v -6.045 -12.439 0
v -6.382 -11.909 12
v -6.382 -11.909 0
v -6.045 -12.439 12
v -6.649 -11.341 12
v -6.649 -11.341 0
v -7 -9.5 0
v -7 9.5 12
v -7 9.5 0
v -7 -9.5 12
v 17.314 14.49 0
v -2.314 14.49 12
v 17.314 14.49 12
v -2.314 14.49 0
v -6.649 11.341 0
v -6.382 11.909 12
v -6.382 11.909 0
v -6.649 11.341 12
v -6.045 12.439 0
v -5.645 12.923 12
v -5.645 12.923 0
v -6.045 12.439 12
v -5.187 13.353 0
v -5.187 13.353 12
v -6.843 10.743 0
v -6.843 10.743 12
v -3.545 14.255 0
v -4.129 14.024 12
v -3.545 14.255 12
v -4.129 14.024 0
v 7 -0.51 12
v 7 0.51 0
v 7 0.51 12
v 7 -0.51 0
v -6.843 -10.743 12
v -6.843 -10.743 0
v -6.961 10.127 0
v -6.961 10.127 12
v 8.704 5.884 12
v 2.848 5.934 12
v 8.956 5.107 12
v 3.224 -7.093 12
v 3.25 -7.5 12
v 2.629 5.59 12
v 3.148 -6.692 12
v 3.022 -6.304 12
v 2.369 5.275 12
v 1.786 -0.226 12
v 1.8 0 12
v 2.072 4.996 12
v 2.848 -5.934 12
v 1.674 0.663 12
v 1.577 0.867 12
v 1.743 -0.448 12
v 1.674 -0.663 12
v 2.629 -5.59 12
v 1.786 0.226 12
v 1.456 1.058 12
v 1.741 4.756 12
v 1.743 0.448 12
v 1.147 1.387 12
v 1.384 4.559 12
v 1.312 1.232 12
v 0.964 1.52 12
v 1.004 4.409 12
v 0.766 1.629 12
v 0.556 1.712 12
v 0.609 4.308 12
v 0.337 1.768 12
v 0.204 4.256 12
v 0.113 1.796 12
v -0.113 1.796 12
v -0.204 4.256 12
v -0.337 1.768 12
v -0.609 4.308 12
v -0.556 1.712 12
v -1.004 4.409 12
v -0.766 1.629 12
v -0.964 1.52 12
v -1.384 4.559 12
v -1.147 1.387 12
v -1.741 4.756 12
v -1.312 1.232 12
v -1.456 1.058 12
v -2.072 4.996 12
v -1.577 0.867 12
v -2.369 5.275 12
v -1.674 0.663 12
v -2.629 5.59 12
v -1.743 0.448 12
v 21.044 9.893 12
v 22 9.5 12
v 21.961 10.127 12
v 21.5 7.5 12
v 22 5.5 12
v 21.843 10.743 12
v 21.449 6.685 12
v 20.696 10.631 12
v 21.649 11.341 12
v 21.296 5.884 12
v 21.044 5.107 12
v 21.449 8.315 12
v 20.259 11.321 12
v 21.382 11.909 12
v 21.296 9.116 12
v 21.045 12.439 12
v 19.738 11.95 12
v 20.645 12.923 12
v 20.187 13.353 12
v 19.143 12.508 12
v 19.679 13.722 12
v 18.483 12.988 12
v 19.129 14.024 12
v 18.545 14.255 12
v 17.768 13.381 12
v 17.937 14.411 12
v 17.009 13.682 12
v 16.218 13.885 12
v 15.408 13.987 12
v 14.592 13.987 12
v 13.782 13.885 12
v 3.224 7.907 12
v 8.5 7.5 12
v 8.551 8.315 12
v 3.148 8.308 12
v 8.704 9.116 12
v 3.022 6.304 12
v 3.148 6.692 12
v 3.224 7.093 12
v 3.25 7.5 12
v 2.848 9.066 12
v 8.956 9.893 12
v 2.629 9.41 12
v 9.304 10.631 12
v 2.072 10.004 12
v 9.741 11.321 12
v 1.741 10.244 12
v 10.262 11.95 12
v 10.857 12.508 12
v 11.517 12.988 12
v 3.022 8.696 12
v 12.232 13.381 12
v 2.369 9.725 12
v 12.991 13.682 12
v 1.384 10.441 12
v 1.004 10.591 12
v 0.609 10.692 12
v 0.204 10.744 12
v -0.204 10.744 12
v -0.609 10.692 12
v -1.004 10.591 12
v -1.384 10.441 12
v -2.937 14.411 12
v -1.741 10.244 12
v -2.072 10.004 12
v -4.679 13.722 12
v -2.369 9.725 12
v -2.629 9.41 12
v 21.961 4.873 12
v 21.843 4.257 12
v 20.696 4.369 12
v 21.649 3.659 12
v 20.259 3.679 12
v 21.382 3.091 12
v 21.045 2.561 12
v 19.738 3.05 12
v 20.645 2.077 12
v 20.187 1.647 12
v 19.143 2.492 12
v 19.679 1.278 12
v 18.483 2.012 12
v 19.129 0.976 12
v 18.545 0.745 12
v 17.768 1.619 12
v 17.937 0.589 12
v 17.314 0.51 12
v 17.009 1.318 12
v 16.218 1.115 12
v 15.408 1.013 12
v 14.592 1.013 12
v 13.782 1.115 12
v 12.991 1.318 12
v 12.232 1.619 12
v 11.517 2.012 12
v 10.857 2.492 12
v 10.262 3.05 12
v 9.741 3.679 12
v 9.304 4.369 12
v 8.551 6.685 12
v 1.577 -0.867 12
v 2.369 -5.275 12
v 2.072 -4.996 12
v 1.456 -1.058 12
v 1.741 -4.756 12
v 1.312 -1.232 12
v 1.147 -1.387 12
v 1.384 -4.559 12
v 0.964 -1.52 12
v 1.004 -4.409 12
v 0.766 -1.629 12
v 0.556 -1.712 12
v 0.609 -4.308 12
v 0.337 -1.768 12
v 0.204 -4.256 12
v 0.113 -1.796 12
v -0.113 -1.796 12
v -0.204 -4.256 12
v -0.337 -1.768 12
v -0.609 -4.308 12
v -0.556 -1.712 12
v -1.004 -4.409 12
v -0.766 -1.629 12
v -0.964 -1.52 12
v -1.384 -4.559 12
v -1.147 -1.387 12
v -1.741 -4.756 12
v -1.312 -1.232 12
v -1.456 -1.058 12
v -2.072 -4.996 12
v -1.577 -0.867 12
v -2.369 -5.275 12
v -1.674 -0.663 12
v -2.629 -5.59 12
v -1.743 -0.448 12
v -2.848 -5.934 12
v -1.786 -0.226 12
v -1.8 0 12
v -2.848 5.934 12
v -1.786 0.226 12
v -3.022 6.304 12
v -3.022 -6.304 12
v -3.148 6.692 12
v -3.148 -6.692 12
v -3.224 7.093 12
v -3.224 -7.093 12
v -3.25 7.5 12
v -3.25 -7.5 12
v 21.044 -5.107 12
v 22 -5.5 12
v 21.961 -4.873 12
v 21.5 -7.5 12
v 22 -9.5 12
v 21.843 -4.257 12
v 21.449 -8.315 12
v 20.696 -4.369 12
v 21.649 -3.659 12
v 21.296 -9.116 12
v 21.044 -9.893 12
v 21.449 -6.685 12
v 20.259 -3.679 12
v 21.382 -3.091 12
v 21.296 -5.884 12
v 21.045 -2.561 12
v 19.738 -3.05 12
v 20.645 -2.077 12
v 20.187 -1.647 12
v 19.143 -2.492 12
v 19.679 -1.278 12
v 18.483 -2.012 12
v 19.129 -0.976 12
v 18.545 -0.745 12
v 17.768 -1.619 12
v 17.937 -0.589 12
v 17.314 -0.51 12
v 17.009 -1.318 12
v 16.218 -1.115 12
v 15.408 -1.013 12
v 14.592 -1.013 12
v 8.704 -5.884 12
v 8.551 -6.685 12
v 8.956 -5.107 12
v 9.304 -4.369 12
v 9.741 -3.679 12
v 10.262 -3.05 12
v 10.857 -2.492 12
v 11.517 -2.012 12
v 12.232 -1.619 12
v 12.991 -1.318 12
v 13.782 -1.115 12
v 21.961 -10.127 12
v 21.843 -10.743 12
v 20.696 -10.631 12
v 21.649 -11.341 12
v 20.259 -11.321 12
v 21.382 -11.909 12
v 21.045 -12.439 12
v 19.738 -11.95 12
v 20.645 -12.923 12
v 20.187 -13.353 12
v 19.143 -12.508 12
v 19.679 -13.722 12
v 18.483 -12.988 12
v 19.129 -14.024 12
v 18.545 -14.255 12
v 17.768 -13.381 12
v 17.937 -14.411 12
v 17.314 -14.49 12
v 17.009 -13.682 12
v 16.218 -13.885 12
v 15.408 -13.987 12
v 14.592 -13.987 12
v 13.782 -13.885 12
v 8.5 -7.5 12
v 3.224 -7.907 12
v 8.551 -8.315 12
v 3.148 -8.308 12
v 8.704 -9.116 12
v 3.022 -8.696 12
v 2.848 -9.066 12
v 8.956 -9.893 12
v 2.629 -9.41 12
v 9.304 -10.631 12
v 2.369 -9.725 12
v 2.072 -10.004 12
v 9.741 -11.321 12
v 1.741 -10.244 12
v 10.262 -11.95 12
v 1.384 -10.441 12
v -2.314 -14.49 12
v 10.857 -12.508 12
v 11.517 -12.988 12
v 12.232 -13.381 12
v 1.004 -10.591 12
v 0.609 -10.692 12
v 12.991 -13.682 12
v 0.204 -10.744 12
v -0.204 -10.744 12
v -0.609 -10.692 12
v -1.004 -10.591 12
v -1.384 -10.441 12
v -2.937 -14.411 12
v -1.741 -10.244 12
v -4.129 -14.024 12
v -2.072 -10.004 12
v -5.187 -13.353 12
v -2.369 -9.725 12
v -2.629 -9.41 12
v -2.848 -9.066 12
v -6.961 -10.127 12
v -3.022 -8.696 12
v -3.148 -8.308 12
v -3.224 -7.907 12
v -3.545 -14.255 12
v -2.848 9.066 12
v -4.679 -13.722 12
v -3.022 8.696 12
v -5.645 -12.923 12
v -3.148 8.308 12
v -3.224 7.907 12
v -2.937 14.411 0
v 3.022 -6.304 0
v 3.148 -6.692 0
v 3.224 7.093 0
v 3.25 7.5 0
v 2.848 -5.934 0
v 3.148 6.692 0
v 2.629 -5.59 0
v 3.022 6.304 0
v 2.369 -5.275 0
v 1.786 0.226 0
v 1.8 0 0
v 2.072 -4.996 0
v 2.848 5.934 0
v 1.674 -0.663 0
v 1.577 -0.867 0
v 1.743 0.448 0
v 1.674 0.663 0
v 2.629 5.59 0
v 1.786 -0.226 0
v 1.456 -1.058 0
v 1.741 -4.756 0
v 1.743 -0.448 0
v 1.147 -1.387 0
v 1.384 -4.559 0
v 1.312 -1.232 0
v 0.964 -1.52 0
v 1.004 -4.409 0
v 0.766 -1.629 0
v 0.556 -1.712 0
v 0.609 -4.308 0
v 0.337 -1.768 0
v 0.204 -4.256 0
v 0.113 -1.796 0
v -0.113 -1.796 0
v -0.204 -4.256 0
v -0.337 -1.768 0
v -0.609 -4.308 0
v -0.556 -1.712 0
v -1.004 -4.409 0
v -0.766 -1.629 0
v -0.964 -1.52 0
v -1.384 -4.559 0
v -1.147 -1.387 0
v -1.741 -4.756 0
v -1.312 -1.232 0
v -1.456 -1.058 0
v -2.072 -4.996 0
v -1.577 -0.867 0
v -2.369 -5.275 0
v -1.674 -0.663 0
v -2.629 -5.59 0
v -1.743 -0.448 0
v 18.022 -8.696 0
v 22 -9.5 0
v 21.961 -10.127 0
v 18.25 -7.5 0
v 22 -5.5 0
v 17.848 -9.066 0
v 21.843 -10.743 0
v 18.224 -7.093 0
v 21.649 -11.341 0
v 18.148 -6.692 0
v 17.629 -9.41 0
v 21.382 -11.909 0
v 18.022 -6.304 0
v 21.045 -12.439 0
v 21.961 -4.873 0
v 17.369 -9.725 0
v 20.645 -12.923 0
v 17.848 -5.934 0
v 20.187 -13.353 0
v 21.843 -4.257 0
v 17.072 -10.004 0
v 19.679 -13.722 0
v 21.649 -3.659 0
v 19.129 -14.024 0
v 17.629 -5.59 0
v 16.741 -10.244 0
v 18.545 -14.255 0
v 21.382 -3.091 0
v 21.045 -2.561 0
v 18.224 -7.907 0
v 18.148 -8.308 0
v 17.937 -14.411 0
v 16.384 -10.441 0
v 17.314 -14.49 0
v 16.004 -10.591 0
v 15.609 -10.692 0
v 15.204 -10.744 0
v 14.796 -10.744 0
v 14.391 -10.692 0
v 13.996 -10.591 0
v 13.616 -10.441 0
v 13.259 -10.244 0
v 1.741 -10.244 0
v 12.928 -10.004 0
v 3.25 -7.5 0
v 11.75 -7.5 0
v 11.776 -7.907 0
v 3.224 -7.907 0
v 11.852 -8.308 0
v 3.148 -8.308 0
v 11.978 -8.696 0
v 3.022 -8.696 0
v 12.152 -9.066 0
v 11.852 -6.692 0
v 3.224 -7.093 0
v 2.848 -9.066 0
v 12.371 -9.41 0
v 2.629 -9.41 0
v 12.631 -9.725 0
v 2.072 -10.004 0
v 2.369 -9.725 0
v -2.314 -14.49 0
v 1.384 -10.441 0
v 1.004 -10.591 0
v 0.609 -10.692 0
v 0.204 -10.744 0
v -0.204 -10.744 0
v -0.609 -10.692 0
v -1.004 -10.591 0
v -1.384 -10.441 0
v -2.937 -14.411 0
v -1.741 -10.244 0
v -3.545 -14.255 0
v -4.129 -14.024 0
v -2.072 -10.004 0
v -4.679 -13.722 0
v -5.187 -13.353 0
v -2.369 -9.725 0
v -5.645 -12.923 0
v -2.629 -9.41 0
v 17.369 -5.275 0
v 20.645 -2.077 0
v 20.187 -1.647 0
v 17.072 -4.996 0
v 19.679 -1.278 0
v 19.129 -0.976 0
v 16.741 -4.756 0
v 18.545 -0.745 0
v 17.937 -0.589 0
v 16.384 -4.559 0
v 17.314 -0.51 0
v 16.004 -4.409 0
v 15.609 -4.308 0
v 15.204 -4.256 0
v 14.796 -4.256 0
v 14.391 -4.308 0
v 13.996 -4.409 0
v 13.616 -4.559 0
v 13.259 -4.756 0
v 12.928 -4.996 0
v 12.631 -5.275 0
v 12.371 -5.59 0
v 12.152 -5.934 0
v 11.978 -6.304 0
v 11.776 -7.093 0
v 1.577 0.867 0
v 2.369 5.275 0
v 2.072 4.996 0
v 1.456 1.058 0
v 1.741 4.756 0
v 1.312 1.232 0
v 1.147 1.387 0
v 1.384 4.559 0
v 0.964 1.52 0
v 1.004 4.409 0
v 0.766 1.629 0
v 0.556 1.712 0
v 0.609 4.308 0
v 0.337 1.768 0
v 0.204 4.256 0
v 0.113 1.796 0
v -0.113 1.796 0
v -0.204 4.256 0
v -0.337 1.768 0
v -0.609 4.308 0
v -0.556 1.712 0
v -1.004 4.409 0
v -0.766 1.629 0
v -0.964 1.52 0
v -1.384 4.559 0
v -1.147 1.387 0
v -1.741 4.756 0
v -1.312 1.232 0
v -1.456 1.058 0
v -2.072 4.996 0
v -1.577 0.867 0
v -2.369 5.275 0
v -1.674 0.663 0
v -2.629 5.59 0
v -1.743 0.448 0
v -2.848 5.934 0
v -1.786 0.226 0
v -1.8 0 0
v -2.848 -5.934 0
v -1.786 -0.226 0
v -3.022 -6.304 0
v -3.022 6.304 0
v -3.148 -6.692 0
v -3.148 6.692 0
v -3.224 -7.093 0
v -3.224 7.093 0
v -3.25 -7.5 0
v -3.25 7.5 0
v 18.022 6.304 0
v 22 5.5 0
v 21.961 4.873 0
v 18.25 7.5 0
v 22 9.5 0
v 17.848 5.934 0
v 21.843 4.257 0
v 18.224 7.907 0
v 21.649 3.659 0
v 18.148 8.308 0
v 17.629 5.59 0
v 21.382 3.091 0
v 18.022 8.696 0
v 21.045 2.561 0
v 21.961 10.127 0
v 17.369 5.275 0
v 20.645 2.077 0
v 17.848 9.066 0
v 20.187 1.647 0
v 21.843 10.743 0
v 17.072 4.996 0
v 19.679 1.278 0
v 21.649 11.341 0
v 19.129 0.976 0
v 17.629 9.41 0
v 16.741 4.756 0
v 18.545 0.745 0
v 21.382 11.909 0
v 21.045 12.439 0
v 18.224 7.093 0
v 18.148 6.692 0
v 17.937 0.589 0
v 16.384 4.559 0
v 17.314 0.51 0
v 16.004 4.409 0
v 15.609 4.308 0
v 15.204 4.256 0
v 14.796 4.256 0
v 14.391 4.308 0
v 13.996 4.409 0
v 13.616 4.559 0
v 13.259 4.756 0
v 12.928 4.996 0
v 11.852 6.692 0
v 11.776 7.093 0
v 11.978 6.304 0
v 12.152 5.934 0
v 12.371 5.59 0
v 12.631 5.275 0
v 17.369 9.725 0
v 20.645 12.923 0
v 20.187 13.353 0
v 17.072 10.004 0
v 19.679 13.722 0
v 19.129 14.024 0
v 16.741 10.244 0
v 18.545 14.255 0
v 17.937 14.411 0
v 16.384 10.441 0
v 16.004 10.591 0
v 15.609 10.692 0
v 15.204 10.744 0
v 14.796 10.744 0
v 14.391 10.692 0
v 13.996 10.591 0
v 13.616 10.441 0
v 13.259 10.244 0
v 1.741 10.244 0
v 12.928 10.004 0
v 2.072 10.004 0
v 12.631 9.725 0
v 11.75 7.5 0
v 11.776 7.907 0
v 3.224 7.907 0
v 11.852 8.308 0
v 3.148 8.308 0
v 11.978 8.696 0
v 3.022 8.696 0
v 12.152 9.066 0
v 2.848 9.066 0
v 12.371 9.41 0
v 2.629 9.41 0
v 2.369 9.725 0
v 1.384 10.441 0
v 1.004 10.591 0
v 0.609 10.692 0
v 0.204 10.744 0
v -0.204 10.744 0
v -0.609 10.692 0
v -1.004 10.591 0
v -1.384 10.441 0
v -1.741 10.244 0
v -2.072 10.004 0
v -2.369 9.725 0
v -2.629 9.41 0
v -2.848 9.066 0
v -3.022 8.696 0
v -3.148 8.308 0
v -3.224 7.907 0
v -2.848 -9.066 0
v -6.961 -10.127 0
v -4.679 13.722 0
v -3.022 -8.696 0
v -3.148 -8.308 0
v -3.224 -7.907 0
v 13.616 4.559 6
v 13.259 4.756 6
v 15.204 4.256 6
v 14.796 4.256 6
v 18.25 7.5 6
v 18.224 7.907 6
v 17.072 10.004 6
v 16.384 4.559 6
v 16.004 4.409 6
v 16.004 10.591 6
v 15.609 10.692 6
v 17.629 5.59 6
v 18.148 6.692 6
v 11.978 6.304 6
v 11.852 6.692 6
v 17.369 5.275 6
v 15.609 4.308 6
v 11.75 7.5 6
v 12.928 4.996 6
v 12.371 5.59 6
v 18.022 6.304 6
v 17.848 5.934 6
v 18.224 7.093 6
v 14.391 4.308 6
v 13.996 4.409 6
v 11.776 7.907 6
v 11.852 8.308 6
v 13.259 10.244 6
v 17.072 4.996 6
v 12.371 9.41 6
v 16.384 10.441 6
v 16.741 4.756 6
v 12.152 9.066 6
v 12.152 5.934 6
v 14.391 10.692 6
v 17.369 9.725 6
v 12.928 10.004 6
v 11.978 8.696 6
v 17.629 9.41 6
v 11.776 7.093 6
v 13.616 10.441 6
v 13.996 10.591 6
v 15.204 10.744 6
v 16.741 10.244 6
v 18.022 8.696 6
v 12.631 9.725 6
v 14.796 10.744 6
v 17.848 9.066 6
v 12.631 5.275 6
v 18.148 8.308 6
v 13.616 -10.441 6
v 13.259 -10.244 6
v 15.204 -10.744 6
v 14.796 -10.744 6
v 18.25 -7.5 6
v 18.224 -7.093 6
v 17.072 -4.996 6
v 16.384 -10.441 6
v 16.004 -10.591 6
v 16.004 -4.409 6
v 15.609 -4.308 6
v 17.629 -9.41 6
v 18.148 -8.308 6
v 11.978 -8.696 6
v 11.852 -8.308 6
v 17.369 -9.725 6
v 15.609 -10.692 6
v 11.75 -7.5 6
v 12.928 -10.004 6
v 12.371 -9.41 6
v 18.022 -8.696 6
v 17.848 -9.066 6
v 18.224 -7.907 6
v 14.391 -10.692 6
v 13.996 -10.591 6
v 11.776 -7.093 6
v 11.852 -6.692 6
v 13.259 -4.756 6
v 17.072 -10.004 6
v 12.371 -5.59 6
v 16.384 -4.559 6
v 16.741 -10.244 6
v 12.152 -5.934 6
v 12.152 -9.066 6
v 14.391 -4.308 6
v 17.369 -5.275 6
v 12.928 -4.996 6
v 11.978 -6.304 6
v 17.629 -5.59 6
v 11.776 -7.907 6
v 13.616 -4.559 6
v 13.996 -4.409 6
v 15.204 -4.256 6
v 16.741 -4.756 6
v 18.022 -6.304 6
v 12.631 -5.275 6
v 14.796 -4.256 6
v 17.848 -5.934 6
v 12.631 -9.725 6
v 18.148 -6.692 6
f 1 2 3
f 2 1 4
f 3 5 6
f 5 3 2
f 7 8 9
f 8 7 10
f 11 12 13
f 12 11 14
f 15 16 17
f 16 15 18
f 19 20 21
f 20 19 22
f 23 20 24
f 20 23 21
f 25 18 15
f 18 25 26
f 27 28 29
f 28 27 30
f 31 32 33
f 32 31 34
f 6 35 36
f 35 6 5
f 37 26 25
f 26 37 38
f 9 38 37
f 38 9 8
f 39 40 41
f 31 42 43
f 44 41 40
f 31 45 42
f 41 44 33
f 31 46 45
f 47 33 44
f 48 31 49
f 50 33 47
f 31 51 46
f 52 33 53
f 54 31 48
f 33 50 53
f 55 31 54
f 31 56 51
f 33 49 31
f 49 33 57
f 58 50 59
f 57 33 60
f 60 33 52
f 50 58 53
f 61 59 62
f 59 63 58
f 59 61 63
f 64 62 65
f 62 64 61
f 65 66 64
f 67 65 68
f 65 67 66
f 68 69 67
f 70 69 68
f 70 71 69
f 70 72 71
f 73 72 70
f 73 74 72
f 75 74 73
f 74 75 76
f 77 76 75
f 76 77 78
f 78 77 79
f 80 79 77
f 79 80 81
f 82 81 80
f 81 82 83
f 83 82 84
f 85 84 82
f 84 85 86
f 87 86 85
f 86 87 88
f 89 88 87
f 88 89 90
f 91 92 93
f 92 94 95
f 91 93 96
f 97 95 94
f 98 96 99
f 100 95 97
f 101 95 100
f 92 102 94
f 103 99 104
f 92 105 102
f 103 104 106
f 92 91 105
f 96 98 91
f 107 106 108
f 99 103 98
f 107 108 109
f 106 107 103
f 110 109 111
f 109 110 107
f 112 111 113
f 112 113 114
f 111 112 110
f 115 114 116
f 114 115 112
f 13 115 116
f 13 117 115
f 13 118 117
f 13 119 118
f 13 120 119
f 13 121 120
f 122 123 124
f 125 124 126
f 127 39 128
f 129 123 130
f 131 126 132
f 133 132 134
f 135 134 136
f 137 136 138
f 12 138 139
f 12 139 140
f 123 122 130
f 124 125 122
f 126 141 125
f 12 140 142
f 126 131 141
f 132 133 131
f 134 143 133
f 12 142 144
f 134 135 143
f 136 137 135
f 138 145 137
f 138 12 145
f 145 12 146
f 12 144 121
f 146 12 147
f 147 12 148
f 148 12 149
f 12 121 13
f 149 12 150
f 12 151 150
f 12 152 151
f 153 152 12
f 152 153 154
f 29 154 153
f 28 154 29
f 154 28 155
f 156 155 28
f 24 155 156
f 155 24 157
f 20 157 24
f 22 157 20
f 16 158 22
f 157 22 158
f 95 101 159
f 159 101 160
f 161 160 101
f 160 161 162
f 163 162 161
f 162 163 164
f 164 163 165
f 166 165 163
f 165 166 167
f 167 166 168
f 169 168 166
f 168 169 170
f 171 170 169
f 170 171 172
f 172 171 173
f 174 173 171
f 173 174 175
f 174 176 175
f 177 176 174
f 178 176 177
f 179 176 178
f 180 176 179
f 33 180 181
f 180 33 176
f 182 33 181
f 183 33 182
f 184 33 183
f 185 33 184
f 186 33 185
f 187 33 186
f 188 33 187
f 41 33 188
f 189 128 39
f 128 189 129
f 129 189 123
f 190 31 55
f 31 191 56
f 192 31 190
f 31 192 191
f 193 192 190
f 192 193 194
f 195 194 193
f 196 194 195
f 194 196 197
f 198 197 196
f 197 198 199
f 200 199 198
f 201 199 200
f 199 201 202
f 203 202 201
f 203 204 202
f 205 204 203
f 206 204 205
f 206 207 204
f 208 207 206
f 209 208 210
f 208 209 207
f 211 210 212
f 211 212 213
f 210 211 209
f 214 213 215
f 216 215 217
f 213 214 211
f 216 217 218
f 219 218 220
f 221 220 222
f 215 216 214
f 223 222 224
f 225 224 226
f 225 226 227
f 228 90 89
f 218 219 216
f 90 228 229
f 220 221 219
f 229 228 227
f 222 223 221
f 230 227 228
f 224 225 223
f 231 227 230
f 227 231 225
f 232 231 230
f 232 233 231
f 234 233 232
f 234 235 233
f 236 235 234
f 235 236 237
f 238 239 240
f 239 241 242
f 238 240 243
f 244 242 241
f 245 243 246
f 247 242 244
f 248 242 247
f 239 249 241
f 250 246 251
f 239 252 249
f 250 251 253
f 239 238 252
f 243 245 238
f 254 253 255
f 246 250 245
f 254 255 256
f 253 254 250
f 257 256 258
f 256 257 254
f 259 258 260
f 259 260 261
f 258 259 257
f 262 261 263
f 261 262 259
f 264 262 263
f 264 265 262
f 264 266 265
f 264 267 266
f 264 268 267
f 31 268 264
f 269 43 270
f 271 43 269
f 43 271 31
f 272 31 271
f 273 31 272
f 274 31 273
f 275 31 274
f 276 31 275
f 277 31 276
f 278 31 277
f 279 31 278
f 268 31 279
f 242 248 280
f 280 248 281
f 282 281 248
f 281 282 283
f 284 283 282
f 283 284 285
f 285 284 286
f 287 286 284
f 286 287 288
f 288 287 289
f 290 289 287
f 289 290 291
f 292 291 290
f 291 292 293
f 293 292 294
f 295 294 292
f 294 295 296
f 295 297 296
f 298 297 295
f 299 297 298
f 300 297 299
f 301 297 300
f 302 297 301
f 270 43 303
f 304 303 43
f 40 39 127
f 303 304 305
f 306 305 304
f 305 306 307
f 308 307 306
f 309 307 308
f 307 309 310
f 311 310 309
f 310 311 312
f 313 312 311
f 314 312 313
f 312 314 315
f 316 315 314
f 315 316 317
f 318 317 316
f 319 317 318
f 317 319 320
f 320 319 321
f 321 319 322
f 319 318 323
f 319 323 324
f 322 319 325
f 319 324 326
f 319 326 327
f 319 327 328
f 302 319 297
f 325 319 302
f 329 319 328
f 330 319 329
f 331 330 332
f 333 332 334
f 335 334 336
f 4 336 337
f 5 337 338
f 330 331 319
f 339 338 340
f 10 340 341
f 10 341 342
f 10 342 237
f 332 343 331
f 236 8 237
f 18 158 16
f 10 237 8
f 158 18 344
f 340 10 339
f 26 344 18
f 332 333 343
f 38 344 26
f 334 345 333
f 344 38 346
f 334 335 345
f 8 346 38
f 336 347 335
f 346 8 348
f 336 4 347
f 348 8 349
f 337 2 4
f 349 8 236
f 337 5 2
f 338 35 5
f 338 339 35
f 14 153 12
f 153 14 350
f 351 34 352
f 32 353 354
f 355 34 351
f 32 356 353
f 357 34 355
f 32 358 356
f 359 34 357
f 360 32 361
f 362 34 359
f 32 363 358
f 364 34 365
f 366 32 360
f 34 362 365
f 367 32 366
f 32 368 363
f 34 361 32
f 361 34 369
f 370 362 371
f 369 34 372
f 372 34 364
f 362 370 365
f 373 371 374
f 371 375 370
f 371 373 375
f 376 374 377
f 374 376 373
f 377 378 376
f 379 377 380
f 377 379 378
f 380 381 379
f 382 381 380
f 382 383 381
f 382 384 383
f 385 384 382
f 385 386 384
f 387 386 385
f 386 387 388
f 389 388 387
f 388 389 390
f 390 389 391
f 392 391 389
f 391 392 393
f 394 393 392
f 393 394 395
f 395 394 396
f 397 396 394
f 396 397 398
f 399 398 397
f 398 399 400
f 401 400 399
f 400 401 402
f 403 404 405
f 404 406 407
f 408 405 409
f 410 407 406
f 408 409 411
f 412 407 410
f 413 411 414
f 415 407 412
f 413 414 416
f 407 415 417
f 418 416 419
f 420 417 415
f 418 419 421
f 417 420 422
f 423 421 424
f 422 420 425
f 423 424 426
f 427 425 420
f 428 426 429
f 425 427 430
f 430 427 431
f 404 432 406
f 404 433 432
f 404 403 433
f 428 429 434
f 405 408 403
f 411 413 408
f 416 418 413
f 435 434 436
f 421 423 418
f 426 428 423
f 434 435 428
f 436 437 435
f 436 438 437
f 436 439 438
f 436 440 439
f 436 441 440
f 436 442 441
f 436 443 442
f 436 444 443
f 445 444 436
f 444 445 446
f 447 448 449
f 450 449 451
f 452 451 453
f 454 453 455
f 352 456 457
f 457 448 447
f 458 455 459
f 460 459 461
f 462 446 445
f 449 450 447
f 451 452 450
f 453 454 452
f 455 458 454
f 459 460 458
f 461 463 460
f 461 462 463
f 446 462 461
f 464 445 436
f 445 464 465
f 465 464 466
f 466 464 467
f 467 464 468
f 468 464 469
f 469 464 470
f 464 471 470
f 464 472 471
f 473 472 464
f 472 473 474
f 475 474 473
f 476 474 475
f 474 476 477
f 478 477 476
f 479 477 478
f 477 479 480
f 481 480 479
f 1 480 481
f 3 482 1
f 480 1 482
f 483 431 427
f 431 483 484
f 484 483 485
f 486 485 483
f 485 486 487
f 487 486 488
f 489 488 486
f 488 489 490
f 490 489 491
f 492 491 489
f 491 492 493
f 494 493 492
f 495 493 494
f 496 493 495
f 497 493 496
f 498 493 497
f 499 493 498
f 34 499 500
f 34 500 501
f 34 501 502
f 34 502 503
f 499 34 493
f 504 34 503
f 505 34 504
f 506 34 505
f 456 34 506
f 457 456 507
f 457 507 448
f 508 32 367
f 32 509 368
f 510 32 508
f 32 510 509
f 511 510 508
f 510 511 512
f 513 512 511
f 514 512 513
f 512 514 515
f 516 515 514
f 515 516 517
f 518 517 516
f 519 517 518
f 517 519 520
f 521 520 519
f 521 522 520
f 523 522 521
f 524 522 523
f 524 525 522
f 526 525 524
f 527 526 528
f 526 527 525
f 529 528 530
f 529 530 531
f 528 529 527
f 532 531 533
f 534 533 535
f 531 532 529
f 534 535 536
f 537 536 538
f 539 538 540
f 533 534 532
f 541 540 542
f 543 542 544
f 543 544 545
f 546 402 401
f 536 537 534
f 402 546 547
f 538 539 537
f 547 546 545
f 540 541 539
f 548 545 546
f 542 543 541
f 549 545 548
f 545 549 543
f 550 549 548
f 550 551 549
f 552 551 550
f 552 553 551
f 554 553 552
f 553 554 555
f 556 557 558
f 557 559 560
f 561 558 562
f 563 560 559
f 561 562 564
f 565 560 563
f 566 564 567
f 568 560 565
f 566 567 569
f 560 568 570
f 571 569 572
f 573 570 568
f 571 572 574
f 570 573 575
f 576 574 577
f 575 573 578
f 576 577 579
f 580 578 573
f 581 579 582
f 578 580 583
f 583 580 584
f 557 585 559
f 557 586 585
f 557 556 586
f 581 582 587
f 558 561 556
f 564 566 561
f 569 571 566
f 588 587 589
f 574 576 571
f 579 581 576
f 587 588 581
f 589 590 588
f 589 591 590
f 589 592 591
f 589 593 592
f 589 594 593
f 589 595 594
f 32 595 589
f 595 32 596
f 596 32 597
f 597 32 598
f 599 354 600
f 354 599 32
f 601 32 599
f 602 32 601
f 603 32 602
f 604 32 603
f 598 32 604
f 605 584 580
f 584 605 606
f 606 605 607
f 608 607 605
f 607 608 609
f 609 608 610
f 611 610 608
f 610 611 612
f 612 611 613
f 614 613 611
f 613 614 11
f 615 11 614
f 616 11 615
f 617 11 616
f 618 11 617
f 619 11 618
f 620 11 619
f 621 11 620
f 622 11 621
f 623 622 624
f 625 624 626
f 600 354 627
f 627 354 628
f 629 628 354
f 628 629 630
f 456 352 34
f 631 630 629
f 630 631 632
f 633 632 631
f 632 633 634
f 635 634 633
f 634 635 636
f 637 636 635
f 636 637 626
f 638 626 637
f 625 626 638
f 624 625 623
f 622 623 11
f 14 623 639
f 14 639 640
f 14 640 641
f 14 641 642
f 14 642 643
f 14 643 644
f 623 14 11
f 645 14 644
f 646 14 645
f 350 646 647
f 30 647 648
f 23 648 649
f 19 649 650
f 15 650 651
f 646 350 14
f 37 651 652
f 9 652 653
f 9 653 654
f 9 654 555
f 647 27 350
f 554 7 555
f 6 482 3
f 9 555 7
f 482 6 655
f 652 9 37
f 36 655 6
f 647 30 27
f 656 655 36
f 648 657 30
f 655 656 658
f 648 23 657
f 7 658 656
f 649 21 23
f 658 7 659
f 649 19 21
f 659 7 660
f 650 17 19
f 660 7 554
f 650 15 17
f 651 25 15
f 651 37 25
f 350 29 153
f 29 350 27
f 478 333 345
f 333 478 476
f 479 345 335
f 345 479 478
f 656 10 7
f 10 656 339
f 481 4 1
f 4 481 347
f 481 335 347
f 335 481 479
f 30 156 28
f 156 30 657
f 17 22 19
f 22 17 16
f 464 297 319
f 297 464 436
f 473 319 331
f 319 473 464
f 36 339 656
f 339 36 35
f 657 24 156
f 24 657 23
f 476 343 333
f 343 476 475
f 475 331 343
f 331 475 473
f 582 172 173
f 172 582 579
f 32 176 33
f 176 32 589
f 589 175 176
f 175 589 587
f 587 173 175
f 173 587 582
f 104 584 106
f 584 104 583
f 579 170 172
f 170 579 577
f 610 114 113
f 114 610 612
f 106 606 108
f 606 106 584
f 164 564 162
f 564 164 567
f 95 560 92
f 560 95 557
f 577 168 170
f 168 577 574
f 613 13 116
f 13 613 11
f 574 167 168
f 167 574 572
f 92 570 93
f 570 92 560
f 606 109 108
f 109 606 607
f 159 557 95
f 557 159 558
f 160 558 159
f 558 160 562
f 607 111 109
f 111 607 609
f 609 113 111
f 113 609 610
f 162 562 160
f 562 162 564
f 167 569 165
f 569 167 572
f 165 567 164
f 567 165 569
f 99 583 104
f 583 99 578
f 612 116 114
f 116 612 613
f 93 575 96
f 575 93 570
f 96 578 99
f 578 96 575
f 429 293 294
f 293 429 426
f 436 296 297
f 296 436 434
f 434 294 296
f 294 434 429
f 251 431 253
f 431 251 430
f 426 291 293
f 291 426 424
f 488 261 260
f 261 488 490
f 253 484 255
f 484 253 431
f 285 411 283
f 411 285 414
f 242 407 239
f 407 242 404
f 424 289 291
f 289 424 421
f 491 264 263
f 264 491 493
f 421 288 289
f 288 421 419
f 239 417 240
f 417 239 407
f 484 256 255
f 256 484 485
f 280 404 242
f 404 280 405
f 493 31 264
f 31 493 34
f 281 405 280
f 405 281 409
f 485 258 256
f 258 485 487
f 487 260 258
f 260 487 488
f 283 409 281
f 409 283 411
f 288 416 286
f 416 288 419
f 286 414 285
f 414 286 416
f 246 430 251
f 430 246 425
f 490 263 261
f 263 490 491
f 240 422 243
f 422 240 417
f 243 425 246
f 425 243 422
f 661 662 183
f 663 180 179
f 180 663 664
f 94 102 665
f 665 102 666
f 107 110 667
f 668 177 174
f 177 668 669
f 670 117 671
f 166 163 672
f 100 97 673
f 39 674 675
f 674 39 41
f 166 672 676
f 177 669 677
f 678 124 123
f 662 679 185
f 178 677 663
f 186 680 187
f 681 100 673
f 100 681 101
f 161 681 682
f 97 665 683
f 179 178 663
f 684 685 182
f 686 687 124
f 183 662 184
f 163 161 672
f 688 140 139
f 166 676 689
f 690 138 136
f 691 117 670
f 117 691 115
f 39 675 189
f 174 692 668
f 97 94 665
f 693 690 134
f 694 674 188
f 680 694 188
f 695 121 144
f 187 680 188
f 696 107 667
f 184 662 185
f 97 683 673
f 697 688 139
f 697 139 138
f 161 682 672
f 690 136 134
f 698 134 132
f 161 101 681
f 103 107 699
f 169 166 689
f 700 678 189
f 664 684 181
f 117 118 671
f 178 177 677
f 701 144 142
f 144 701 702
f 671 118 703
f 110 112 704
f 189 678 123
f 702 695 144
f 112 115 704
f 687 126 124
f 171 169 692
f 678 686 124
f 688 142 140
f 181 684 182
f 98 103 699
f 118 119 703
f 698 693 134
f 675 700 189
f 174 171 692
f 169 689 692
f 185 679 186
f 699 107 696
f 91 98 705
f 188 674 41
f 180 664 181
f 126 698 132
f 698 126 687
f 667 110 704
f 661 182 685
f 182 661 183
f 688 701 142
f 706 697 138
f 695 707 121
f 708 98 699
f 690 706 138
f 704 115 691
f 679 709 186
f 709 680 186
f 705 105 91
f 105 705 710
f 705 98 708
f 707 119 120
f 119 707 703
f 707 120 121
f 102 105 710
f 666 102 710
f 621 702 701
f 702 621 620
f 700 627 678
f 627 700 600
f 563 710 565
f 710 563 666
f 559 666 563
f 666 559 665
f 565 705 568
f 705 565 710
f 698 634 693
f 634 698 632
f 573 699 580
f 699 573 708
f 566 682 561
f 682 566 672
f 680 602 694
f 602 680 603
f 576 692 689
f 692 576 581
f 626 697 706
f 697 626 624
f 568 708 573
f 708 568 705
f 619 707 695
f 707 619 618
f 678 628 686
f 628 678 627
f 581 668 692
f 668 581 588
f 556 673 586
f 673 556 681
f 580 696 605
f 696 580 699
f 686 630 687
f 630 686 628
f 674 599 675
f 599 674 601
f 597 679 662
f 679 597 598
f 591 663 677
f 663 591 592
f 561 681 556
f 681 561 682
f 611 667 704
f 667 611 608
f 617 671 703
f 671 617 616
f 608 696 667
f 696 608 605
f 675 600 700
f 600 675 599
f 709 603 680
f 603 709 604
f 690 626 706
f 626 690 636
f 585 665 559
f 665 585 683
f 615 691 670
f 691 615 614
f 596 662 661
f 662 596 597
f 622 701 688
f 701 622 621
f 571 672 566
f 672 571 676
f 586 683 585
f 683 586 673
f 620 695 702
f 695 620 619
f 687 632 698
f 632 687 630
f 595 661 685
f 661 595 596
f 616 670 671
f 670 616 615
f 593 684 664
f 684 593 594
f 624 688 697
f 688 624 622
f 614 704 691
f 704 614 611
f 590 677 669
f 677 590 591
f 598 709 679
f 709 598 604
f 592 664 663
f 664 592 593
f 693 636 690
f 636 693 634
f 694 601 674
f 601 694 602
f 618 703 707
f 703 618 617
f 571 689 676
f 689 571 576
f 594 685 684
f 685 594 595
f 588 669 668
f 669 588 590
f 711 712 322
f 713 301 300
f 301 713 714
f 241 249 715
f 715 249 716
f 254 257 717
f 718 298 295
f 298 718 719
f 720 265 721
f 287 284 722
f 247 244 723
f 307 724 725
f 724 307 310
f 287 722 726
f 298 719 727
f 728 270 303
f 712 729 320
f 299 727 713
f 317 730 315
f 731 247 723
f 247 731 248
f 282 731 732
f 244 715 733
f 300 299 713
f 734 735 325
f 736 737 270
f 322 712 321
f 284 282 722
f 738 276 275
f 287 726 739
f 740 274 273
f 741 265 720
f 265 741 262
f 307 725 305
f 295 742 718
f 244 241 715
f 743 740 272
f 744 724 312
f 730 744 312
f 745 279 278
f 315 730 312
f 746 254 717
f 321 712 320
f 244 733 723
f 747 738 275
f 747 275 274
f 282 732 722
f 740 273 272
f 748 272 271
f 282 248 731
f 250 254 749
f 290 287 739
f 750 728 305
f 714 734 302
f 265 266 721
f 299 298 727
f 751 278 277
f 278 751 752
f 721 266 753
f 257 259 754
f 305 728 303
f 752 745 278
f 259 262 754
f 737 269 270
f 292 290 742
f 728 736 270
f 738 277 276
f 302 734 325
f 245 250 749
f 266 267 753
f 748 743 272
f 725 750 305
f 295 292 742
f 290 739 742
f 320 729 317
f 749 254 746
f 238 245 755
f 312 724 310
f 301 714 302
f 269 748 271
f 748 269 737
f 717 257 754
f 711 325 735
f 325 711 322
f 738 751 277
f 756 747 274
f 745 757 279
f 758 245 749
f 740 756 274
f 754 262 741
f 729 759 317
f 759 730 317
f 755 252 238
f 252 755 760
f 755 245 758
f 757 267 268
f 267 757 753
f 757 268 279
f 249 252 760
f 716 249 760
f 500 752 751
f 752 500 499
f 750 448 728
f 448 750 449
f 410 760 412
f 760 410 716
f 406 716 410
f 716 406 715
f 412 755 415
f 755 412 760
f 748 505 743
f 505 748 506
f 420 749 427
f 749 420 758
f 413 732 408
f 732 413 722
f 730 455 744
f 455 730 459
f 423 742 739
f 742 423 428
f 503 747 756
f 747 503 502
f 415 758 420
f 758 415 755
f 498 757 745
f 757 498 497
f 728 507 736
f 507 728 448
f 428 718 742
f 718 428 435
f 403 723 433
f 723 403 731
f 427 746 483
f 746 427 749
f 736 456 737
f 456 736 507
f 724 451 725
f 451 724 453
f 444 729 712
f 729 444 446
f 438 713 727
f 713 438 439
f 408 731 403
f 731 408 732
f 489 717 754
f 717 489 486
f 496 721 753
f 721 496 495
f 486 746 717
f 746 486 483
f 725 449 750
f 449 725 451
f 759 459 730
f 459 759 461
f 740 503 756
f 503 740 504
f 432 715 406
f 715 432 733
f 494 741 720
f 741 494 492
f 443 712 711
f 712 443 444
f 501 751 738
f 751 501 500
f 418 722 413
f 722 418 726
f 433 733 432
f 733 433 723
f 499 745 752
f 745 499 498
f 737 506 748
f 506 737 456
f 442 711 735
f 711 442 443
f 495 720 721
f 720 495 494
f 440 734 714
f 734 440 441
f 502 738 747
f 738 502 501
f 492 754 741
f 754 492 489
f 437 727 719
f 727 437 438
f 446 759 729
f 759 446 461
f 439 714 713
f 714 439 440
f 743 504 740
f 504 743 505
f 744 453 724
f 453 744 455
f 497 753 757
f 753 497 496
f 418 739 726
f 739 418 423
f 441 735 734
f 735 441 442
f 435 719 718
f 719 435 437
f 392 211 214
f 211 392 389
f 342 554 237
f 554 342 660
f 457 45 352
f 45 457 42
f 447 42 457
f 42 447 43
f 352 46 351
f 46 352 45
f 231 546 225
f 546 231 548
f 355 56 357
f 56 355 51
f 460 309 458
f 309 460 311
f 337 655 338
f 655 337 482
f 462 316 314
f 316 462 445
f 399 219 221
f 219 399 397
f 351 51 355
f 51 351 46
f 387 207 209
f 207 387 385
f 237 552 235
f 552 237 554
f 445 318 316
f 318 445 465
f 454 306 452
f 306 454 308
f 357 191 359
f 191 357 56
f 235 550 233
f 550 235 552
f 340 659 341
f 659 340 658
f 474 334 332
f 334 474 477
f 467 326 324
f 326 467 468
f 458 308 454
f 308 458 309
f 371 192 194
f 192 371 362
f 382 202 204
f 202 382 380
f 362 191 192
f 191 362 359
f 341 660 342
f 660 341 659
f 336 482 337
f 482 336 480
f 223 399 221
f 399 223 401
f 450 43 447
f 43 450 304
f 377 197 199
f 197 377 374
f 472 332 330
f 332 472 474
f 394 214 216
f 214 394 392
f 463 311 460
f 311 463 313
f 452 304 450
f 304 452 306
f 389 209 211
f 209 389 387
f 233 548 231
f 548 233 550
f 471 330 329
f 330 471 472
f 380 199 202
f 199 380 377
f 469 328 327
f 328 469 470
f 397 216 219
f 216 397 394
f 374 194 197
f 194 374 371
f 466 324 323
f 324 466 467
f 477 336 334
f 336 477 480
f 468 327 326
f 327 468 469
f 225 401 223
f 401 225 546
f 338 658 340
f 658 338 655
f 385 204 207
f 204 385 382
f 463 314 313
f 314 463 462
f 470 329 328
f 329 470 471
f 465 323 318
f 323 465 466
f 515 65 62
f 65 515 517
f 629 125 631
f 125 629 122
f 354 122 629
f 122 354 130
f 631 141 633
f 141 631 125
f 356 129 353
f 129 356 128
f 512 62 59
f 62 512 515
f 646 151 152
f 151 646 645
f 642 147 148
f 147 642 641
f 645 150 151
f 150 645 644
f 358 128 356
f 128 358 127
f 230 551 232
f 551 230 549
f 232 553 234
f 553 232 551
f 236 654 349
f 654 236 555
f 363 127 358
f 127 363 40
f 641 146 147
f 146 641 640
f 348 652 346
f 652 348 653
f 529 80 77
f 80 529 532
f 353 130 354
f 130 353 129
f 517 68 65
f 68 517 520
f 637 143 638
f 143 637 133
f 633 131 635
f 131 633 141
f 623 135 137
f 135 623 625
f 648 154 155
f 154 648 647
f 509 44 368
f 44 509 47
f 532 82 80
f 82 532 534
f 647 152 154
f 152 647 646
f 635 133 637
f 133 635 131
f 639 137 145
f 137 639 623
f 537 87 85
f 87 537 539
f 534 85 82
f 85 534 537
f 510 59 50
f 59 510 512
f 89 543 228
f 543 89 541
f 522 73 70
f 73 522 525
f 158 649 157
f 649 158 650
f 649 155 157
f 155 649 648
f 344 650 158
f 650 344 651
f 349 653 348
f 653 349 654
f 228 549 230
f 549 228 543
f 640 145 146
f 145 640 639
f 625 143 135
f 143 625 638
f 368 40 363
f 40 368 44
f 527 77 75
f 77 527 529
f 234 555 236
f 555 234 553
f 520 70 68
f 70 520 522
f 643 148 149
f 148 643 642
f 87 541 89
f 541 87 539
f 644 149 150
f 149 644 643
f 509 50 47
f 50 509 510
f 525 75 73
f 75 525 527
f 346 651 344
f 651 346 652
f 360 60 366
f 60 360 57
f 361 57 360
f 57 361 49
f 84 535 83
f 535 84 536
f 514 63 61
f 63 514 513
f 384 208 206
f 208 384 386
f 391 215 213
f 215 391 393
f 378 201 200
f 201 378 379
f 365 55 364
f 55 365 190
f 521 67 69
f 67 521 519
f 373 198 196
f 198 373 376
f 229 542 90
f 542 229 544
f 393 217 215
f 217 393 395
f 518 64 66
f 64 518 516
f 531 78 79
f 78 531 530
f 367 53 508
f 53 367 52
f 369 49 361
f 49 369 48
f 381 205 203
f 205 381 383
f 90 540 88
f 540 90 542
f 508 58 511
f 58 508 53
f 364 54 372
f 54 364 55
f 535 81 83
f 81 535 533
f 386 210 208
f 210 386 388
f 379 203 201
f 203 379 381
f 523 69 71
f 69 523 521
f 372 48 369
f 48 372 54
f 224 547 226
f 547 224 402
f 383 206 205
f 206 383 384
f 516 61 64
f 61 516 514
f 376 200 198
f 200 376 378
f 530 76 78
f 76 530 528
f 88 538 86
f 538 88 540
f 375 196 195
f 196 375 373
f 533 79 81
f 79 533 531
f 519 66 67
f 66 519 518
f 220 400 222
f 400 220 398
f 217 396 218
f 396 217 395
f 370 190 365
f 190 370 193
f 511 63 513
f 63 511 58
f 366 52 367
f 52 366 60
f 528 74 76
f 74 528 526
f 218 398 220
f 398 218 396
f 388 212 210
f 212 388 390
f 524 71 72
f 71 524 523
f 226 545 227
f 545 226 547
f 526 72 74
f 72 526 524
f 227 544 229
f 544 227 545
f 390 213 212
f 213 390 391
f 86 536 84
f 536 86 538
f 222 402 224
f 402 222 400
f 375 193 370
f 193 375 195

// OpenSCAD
$fn = 50;


difference() {
	union() {
		hull() {
			translate(v = [-2.0000000000, 9.5000000000, 0]) {
				cylinder(h = 12, r = 5);
			}
			translate(v = [2.0000000000, 9.5000000000, 0]) {
				cylinder(h = 12, r = 5);
			}
			translate(v = [-2.0000000000, -9.5000000000, 0]) {
				cylinder(h = 12, r = 5);
			}
			translate(v = [2.0000000000, -9.5000000000, 0]) {
				cylinder(h = 12, r = 5);
			}
		}
		translate(v = [7.5000000000, 7.5000000000, 0]) {
			hull() {
				translate(v = [-9.5000000000, 2.0000000000, 0]) {
					cylinder(h = 12, r = 5);
				}
				translate(v = [9.5000000000, 2.0000000000, 0]) {
					cylinder(h = 12, r = 5);
				}
				translate(v = [-9.5000000000, -2.0000000000, 0]) {
					cylinder(h = 12, r = 5);
				}
				translate(v = [9.5000000000, -2.0000000000, 0]) {
					cylinder(h = 12, r = 5);
				}
			}
		}
		translate(v = [7.5000000000, -7.5000000000, 0]) {
			hull() {
				translate(v = [-9.5000000000, 2.0000000000, 0]) {
					cylinder(h = 12, r = 5);
				}
				translate(v = [9.5000000000, 2.0000000000, 0]) {
					cylinder(h = 12, r = 5);
				}
				translate(v = [-9.5000000000, -2.0000000000, 0]) {
					cylinder(h = 12, r = 5);
				}
				translate(v = [9.5000000000, -2.0000000000, 0]) {
					cylinder(h = 12, r = 5);
				}
			}
		}
	}
	union() {
		translate(v = [15.0000000000, 7.5000000000, 12]) {
			rotate(a = [0, 0, 0]) {
				difference() {
					union() {
						#translate(v = [0, 0, -12.0000000000]) {
							cylinder(h = 12, r = 2.2500000000);
						}
						#translate(v = [0, 0, -6]) {
							cylinder(h = 6, r1 = 3.2500000000, r2 = 6.5000000000);
						}
						#translate(v = [0, 0, -12.0000000000]) {
							cylinder(h = 12, r = 3.2500000000);
						}
						#translate(v = [0, 0, -12.0000000000]) {
							cylinder(h = 12, r = 2.2500000000);
						}
					}
					union();
				}
			}
		}
		translate(v = [15.0000000000, -7.5000000000, 12]) {
			rotate(a = [0, 0, 0]) {
				difference() {
					union() {
						#translate(v = [0, 0, -12.0000000000]) {
							cylinder(h = 12, r = 2.2500000000);
						}
						#translate(v = [0, 0, -6]) {
							cylinder(h = 6, r1 = 3.2500000000, r2 = 6.5000000000);
						}
						#translate(v = [0, 0, -12.0000000000]) {
							cylinder(h = 12, r = 3.2500000000);
						}
						#translate(v = [0, 0, -12.0000000000]) {
							cylinder(h = 12, r = 2.2500000000);
						}
					}
					union();
				}
			}
		}
		translate(v = [0.0000000000, -7.5000000000, 0]) {
			translate(v = [0, 0, -100]) {
				cylinder(h = 200, r = 3.2500000000);
			}
		}
		translate(v = [0.0000000000, 7.5000000000, 0]) {
			translate(v = [0, 0, -100]) {
				cylinder(h = 200, r = 3.2500000000);
			}
		}
		translate(v = [0.0000000000, -7.5000000000, 0]) {
			translate(v = [0, 0, -100]) {
				cylinder(h = 200, r = 1.8000000000);
			}
		}
		translate(v = [0, 0, -100]) {
			cylinder(h = 200, r = 1.8000000000);
		}
		translate(v = [0.0000000000, 7.5000000000, 0]) {
			translate(v = [0, 0, -100]) {
				cylinder(h = 200, r = 1.8000000000);
			}
		}
	}
}
